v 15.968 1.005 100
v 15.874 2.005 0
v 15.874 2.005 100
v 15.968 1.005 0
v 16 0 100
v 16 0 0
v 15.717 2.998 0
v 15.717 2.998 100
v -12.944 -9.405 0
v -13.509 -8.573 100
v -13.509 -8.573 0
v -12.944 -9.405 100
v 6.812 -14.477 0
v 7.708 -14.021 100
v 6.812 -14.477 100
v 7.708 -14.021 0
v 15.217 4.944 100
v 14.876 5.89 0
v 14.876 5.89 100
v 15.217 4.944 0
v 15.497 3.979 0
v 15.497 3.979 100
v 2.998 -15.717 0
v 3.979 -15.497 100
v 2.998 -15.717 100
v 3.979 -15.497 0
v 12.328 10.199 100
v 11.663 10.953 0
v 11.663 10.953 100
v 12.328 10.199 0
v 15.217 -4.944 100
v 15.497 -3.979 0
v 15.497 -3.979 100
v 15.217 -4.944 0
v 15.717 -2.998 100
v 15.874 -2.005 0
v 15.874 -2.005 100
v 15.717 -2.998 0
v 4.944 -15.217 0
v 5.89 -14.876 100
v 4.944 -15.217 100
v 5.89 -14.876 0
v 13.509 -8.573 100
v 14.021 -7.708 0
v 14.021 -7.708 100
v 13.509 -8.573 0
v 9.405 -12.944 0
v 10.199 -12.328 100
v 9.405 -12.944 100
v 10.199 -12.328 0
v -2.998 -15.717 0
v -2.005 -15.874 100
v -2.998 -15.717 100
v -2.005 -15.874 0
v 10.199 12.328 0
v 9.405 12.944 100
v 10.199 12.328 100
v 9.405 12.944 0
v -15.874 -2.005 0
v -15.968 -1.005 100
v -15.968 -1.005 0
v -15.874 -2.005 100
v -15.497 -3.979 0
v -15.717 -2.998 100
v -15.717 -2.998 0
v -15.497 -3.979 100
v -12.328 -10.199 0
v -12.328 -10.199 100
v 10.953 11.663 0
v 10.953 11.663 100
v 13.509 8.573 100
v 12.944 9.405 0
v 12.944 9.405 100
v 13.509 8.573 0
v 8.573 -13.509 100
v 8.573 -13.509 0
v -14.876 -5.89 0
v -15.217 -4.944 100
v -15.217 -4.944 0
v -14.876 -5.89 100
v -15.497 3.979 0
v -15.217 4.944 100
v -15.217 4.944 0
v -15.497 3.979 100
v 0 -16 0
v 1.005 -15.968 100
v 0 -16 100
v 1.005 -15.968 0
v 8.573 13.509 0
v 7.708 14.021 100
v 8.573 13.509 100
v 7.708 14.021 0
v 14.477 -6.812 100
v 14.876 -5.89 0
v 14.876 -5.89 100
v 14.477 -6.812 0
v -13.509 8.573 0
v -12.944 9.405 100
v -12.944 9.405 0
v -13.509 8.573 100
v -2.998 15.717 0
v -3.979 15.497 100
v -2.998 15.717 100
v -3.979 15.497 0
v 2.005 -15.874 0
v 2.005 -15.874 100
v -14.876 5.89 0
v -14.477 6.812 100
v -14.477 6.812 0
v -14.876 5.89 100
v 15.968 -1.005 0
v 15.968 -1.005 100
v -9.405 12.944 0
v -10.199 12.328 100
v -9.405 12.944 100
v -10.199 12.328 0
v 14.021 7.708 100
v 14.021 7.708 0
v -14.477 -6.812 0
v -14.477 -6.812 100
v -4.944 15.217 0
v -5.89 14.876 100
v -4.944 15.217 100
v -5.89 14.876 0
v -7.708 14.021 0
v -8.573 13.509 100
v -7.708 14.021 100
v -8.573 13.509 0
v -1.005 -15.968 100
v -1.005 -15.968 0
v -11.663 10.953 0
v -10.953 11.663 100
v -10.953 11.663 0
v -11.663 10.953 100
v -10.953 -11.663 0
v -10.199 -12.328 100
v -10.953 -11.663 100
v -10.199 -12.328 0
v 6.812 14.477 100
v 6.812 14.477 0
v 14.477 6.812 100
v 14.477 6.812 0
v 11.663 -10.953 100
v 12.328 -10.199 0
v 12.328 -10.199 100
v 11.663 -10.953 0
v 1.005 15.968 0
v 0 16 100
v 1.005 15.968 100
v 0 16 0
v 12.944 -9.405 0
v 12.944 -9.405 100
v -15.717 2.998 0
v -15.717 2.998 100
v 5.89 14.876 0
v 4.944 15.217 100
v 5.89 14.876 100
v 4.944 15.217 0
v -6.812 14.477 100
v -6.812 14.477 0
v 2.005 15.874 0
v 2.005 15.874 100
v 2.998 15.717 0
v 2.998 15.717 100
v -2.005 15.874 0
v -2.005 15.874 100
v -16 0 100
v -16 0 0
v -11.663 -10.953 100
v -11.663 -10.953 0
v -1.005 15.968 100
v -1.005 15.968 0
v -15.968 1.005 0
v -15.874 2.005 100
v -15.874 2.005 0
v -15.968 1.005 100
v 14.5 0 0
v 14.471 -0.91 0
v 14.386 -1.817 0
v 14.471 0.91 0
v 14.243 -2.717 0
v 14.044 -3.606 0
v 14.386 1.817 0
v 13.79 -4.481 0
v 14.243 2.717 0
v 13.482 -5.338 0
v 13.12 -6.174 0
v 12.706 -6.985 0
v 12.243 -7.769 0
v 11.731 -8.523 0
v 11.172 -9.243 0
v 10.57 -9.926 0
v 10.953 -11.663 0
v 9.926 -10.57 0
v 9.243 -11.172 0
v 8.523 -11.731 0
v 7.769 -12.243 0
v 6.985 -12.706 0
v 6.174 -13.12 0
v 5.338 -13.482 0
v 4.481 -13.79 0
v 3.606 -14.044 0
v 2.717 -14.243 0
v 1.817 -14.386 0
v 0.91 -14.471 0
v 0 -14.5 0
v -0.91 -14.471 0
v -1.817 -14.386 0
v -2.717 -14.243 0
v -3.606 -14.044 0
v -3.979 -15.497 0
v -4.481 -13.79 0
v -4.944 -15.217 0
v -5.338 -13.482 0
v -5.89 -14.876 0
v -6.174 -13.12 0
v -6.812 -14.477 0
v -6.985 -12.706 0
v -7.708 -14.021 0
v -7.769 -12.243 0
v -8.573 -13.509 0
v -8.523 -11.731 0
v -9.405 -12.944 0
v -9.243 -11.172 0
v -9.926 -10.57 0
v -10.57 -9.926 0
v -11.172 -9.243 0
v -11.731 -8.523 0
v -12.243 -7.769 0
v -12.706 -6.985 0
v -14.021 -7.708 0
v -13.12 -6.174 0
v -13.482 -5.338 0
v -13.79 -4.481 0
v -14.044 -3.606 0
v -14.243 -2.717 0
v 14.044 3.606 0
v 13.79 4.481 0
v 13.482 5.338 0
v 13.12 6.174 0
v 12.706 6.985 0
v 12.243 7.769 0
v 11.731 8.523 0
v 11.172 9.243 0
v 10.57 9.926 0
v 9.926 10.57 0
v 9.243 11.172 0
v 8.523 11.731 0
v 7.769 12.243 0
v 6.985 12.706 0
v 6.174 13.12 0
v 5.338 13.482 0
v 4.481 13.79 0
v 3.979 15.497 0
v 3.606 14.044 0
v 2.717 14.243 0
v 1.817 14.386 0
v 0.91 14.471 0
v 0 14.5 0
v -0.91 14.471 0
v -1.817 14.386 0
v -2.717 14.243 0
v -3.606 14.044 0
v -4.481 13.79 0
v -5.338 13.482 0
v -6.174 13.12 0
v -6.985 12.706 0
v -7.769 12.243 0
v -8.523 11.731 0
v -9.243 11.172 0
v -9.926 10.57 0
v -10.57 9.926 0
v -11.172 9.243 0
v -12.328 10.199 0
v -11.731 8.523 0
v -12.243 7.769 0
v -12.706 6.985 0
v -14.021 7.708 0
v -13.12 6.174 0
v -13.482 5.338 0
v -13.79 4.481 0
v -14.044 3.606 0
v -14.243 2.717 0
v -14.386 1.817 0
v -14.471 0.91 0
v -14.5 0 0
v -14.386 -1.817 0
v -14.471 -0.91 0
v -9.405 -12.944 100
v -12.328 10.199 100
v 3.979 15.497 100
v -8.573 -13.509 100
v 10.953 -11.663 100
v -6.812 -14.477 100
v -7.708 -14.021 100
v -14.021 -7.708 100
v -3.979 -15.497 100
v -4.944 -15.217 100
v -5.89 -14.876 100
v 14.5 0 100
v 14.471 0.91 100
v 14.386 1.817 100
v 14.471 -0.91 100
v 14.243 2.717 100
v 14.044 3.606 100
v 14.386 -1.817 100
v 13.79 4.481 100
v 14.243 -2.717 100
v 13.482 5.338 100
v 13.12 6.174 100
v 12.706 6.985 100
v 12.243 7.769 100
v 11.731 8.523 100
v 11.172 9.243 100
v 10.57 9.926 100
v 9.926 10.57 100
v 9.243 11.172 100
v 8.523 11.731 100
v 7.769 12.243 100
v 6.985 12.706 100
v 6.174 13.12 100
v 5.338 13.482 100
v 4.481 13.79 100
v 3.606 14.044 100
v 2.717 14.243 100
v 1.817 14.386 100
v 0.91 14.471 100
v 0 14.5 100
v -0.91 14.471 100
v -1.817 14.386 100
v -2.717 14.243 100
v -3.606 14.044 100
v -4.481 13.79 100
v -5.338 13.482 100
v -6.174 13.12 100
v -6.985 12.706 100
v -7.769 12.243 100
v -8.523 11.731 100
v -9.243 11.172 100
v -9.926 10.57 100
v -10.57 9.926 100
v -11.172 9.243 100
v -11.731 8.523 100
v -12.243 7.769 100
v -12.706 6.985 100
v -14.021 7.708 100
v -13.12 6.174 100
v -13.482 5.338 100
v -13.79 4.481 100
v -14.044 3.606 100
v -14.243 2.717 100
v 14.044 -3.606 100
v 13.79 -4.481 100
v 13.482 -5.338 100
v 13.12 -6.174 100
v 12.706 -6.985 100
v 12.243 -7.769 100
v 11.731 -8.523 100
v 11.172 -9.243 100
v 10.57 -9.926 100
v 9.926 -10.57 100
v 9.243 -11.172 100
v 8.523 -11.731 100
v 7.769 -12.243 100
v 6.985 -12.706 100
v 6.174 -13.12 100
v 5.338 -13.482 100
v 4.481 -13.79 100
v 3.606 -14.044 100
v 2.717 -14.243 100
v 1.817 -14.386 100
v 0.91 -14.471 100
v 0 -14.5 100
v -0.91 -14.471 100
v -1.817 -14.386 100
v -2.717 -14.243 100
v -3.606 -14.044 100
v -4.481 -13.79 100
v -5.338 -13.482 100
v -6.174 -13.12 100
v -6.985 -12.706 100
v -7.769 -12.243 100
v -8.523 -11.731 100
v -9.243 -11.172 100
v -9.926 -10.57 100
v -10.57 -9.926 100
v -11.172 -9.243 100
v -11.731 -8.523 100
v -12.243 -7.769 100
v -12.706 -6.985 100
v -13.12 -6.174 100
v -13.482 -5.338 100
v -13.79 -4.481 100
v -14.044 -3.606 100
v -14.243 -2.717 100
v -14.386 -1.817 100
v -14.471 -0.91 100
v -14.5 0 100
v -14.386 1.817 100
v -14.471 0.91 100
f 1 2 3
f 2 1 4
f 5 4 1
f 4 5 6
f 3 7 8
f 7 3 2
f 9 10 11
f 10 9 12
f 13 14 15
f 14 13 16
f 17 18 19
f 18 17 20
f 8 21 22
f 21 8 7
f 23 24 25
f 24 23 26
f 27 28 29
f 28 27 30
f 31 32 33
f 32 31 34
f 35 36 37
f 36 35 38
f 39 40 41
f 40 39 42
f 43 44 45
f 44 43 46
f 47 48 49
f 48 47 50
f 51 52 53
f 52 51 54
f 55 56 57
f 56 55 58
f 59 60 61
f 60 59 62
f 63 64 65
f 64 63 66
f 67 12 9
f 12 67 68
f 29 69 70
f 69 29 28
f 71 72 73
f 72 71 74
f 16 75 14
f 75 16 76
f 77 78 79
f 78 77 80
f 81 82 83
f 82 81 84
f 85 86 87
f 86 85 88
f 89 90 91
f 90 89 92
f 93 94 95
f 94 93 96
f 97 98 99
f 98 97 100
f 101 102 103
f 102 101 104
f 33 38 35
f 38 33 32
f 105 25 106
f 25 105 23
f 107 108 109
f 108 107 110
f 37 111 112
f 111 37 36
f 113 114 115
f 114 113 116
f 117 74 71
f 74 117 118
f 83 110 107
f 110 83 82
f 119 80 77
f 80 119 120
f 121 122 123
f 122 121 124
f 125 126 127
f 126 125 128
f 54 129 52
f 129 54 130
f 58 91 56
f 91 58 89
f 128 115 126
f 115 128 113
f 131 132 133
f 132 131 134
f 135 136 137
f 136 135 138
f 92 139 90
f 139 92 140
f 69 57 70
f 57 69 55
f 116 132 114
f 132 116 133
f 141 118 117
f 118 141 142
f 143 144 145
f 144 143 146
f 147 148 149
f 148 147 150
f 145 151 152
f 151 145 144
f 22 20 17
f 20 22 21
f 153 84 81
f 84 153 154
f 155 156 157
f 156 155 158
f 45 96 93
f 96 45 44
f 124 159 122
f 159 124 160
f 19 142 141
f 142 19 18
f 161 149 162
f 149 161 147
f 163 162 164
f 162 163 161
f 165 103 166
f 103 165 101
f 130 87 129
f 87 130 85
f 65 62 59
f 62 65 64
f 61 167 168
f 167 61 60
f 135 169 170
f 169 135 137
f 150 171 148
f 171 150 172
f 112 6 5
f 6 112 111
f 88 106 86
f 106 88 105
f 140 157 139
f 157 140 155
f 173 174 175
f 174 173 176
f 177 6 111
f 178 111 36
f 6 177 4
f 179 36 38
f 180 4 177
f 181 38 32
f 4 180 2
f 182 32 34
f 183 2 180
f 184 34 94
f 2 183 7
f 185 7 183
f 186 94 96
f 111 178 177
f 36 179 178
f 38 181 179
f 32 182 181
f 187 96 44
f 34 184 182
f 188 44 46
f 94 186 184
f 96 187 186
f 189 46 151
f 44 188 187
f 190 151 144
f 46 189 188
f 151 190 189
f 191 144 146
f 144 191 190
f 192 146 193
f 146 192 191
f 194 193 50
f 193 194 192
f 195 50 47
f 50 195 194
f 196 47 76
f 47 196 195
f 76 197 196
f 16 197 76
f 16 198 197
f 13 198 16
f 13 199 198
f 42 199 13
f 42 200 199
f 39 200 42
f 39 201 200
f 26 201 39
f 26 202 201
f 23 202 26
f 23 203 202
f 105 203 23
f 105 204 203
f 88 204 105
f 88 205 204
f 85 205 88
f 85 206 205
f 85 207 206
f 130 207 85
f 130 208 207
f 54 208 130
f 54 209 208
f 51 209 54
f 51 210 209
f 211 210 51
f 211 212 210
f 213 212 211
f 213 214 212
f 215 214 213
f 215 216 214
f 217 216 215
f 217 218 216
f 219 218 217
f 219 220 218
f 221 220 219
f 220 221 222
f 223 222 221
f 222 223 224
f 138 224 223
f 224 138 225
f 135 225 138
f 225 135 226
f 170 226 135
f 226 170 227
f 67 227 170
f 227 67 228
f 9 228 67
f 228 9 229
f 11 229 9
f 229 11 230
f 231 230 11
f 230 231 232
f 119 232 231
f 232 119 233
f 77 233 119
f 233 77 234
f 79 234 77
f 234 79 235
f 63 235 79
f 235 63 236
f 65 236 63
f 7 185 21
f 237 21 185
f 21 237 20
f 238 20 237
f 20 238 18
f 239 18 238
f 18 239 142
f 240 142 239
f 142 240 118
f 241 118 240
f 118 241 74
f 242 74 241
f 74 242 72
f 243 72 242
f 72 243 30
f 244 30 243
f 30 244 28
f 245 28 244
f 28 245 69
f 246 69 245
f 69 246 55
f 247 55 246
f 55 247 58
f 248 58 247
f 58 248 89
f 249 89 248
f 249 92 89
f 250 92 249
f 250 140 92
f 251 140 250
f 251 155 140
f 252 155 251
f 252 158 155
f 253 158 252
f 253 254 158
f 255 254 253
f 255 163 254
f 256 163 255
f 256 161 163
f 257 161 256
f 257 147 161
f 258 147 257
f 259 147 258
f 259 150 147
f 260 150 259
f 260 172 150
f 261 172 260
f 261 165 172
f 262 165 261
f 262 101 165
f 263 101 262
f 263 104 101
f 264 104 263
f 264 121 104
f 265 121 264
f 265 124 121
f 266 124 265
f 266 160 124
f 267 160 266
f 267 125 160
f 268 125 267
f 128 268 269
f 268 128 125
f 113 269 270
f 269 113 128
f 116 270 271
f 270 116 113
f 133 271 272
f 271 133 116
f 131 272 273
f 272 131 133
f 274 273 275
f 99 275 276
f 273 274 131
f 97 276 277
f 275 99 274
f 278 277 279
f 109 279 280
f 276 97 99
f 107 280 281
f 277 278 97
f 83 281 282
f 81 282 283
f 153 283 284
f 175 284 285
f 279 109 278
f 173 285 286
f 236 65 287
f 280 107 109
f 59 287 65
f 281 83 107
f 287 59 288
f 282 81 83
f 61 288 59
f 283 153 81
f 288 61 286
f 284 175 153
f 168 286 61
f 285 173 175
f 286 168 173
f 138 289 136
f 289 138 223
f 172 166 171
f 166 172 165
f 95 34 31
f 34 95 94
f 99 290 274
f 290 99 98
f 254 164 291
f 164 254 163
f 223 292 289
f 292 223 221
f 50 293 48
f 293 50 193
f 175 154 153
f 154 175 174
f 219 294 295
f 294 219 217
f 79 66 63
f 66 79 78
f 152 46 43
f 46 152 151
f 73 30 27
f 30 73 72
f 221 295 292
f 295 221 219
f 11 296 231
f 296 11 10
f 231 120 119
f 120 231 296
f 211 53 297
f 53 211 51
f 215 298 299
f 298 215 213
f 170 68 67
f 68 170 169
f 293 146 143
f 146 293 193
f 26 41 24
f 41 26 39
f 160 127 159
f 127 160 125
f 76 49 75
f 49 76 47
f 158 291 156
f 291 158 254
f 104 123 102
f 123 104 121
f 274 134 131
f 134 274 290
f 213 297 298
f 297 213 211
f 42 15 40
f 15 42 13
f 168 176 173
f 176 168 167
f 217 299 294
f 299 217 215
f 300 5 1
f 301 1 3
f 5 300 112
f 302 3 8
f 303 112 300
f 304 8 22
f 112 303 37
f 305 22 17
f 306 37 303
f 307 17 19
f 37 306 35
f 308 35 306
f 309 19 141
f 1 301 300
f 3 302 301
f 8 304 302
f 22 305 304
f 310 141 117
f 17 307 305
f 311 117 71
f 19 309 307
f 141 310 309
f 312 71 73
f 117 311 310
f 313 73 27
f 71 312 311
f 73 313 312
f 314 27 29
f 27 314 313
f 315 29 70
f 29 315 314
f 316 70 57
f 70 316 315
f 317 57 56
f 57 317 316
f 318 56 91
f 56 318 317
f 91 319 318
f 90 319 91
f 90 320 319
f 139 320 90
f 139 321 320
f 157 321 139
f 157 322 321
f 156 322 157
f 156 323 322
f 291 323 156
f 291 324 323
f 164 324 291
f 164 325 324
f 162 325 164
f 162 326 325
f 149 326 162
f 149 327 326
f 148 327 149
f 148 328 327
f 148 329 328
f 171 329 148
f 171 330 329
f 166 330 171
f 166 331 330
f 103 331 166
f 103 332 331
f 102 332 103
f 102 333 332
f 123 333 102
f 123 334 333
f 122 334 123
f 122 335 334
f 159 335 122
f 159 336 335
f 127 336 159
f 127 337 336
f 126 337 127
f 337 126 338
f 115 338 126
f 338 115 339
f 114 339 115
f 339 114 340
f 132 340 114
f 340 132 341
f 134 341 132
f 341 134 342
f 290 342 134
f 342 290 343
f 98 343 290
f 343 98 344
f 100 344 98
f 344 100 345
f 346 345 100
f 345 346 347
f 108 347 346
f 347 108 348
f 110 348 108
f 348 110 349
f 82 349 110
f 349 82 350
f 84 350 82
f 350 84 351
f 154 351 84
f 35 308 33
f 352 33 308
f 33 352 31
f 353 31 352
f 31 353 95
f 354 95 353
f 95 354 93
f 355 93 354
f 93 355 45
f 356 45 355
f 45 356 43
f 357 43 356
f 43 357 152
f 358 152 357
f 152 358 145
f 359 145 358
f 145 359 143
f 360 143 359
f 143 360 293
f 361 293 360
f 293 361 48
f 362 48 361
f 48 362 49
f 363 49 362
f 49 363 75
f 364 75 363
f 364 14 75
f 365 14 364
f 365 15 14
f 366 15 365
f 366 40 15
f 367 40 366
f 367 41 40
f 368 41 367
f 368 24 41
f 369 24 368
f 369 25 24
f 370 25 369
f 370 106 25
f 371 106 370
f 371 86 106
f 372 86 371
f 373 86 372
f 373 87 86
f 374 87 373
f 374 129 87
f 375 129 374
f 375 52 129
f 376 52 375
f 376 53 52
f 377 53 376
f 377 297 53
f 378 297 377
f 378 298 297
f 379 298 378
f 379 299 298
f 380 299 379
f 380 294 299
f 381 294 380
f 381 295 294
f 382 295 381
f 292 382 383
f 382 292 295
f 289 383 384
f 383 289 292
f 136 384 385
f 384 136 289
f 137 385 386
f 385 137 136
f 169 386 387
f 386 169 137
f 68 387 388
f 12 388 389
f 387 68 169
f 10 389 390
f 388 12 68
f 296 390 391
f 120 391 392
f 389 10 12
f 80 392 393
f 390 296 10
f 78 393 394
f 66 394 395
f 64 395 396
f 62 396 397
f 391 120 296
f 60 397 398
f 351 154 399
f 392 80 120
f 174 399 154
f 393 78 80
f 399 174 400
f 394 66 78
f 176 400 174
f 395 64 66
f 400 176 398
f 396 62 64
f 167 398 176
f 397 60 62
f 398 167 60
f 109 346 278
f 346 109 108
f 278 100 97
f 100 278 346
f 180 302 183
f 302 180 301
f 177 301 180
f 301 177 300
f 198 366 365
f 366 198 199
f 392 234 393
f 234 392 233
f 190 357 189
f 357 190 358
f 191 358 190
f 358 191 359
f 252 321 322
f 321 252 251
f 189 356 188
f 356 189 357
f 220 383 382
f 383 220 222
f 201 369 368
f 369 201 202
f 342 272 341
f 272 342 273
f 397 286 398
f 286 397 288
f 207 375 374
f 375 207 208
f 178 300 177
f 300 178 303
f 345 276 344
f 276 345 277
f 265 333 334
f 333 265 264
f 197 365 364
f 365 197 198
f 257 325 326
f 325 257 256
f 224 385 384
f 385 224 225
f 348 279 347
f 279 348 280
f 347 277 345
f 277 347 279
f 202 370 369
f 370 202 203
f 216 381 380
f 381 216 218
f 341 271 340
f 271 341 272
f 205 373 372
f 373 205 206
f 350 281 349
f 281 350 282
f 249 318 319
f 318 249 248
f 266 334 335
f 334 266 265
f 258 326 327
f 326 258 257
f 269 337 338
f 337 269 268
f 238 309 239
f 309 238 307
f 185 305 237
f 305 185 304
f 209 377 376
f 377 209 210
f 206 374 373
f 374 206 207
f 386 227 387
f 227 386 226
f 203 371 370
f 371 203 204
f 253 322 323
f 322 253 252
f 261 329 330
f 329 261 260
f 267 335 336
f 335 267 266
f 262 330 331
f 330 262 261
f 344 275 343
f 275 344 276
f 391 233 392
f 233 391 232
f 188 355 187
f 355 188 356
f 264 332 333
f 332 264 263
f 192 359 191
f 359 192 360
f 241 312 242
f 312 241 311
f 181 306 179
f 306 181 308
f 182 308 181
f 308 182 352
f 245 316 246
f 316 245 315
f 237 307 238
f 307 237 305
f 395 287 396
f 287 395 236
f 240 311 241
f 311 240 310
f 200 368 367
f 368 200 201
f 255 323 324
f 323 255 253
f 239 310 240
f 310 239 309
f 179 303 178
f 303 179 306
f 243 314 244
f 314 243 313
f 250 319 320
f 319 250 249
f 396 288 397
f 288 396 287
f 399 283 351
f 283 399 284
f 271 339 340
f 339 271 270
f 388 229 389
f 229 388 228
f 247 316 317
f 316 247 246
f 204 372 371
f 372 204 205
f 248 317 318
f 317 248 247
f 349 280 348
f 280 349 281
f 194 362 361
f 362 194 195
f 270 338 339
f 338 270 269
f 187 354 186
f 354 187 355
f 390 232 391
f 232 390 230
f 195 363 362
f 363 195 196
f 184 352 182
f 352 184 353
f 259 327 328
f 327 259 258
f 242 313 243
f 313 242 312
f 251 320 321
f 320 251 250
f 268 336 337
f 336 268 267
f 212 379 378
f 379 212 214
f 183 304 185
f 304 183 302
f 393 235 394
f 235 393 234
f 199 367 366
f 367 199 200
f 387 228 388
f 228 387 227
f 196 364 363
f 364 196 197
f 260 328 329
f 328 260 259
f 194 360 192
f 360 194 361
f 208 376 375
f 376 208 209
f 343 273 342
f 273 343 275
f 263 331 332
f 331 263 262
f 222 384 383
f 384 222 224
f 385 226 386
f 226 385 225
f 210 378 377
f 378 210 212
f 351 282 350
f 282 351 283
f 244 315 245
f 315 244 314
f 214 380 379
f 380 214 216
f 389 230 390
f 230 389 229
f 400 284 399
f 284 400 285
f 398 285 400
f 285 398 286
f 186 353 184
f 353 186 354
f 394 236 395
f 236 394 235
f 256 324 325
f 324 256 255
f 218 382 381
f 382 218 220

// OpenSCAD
INNER_DIA = 29;
OUTER_DIA = 32;

LENGTH = 100;

$fn = 100;

difference() {
  cylinder(d = OUTER_DIA, h = LENGTH);
  cylinder(d = INNER_DIA, h = LENGTH);
}
